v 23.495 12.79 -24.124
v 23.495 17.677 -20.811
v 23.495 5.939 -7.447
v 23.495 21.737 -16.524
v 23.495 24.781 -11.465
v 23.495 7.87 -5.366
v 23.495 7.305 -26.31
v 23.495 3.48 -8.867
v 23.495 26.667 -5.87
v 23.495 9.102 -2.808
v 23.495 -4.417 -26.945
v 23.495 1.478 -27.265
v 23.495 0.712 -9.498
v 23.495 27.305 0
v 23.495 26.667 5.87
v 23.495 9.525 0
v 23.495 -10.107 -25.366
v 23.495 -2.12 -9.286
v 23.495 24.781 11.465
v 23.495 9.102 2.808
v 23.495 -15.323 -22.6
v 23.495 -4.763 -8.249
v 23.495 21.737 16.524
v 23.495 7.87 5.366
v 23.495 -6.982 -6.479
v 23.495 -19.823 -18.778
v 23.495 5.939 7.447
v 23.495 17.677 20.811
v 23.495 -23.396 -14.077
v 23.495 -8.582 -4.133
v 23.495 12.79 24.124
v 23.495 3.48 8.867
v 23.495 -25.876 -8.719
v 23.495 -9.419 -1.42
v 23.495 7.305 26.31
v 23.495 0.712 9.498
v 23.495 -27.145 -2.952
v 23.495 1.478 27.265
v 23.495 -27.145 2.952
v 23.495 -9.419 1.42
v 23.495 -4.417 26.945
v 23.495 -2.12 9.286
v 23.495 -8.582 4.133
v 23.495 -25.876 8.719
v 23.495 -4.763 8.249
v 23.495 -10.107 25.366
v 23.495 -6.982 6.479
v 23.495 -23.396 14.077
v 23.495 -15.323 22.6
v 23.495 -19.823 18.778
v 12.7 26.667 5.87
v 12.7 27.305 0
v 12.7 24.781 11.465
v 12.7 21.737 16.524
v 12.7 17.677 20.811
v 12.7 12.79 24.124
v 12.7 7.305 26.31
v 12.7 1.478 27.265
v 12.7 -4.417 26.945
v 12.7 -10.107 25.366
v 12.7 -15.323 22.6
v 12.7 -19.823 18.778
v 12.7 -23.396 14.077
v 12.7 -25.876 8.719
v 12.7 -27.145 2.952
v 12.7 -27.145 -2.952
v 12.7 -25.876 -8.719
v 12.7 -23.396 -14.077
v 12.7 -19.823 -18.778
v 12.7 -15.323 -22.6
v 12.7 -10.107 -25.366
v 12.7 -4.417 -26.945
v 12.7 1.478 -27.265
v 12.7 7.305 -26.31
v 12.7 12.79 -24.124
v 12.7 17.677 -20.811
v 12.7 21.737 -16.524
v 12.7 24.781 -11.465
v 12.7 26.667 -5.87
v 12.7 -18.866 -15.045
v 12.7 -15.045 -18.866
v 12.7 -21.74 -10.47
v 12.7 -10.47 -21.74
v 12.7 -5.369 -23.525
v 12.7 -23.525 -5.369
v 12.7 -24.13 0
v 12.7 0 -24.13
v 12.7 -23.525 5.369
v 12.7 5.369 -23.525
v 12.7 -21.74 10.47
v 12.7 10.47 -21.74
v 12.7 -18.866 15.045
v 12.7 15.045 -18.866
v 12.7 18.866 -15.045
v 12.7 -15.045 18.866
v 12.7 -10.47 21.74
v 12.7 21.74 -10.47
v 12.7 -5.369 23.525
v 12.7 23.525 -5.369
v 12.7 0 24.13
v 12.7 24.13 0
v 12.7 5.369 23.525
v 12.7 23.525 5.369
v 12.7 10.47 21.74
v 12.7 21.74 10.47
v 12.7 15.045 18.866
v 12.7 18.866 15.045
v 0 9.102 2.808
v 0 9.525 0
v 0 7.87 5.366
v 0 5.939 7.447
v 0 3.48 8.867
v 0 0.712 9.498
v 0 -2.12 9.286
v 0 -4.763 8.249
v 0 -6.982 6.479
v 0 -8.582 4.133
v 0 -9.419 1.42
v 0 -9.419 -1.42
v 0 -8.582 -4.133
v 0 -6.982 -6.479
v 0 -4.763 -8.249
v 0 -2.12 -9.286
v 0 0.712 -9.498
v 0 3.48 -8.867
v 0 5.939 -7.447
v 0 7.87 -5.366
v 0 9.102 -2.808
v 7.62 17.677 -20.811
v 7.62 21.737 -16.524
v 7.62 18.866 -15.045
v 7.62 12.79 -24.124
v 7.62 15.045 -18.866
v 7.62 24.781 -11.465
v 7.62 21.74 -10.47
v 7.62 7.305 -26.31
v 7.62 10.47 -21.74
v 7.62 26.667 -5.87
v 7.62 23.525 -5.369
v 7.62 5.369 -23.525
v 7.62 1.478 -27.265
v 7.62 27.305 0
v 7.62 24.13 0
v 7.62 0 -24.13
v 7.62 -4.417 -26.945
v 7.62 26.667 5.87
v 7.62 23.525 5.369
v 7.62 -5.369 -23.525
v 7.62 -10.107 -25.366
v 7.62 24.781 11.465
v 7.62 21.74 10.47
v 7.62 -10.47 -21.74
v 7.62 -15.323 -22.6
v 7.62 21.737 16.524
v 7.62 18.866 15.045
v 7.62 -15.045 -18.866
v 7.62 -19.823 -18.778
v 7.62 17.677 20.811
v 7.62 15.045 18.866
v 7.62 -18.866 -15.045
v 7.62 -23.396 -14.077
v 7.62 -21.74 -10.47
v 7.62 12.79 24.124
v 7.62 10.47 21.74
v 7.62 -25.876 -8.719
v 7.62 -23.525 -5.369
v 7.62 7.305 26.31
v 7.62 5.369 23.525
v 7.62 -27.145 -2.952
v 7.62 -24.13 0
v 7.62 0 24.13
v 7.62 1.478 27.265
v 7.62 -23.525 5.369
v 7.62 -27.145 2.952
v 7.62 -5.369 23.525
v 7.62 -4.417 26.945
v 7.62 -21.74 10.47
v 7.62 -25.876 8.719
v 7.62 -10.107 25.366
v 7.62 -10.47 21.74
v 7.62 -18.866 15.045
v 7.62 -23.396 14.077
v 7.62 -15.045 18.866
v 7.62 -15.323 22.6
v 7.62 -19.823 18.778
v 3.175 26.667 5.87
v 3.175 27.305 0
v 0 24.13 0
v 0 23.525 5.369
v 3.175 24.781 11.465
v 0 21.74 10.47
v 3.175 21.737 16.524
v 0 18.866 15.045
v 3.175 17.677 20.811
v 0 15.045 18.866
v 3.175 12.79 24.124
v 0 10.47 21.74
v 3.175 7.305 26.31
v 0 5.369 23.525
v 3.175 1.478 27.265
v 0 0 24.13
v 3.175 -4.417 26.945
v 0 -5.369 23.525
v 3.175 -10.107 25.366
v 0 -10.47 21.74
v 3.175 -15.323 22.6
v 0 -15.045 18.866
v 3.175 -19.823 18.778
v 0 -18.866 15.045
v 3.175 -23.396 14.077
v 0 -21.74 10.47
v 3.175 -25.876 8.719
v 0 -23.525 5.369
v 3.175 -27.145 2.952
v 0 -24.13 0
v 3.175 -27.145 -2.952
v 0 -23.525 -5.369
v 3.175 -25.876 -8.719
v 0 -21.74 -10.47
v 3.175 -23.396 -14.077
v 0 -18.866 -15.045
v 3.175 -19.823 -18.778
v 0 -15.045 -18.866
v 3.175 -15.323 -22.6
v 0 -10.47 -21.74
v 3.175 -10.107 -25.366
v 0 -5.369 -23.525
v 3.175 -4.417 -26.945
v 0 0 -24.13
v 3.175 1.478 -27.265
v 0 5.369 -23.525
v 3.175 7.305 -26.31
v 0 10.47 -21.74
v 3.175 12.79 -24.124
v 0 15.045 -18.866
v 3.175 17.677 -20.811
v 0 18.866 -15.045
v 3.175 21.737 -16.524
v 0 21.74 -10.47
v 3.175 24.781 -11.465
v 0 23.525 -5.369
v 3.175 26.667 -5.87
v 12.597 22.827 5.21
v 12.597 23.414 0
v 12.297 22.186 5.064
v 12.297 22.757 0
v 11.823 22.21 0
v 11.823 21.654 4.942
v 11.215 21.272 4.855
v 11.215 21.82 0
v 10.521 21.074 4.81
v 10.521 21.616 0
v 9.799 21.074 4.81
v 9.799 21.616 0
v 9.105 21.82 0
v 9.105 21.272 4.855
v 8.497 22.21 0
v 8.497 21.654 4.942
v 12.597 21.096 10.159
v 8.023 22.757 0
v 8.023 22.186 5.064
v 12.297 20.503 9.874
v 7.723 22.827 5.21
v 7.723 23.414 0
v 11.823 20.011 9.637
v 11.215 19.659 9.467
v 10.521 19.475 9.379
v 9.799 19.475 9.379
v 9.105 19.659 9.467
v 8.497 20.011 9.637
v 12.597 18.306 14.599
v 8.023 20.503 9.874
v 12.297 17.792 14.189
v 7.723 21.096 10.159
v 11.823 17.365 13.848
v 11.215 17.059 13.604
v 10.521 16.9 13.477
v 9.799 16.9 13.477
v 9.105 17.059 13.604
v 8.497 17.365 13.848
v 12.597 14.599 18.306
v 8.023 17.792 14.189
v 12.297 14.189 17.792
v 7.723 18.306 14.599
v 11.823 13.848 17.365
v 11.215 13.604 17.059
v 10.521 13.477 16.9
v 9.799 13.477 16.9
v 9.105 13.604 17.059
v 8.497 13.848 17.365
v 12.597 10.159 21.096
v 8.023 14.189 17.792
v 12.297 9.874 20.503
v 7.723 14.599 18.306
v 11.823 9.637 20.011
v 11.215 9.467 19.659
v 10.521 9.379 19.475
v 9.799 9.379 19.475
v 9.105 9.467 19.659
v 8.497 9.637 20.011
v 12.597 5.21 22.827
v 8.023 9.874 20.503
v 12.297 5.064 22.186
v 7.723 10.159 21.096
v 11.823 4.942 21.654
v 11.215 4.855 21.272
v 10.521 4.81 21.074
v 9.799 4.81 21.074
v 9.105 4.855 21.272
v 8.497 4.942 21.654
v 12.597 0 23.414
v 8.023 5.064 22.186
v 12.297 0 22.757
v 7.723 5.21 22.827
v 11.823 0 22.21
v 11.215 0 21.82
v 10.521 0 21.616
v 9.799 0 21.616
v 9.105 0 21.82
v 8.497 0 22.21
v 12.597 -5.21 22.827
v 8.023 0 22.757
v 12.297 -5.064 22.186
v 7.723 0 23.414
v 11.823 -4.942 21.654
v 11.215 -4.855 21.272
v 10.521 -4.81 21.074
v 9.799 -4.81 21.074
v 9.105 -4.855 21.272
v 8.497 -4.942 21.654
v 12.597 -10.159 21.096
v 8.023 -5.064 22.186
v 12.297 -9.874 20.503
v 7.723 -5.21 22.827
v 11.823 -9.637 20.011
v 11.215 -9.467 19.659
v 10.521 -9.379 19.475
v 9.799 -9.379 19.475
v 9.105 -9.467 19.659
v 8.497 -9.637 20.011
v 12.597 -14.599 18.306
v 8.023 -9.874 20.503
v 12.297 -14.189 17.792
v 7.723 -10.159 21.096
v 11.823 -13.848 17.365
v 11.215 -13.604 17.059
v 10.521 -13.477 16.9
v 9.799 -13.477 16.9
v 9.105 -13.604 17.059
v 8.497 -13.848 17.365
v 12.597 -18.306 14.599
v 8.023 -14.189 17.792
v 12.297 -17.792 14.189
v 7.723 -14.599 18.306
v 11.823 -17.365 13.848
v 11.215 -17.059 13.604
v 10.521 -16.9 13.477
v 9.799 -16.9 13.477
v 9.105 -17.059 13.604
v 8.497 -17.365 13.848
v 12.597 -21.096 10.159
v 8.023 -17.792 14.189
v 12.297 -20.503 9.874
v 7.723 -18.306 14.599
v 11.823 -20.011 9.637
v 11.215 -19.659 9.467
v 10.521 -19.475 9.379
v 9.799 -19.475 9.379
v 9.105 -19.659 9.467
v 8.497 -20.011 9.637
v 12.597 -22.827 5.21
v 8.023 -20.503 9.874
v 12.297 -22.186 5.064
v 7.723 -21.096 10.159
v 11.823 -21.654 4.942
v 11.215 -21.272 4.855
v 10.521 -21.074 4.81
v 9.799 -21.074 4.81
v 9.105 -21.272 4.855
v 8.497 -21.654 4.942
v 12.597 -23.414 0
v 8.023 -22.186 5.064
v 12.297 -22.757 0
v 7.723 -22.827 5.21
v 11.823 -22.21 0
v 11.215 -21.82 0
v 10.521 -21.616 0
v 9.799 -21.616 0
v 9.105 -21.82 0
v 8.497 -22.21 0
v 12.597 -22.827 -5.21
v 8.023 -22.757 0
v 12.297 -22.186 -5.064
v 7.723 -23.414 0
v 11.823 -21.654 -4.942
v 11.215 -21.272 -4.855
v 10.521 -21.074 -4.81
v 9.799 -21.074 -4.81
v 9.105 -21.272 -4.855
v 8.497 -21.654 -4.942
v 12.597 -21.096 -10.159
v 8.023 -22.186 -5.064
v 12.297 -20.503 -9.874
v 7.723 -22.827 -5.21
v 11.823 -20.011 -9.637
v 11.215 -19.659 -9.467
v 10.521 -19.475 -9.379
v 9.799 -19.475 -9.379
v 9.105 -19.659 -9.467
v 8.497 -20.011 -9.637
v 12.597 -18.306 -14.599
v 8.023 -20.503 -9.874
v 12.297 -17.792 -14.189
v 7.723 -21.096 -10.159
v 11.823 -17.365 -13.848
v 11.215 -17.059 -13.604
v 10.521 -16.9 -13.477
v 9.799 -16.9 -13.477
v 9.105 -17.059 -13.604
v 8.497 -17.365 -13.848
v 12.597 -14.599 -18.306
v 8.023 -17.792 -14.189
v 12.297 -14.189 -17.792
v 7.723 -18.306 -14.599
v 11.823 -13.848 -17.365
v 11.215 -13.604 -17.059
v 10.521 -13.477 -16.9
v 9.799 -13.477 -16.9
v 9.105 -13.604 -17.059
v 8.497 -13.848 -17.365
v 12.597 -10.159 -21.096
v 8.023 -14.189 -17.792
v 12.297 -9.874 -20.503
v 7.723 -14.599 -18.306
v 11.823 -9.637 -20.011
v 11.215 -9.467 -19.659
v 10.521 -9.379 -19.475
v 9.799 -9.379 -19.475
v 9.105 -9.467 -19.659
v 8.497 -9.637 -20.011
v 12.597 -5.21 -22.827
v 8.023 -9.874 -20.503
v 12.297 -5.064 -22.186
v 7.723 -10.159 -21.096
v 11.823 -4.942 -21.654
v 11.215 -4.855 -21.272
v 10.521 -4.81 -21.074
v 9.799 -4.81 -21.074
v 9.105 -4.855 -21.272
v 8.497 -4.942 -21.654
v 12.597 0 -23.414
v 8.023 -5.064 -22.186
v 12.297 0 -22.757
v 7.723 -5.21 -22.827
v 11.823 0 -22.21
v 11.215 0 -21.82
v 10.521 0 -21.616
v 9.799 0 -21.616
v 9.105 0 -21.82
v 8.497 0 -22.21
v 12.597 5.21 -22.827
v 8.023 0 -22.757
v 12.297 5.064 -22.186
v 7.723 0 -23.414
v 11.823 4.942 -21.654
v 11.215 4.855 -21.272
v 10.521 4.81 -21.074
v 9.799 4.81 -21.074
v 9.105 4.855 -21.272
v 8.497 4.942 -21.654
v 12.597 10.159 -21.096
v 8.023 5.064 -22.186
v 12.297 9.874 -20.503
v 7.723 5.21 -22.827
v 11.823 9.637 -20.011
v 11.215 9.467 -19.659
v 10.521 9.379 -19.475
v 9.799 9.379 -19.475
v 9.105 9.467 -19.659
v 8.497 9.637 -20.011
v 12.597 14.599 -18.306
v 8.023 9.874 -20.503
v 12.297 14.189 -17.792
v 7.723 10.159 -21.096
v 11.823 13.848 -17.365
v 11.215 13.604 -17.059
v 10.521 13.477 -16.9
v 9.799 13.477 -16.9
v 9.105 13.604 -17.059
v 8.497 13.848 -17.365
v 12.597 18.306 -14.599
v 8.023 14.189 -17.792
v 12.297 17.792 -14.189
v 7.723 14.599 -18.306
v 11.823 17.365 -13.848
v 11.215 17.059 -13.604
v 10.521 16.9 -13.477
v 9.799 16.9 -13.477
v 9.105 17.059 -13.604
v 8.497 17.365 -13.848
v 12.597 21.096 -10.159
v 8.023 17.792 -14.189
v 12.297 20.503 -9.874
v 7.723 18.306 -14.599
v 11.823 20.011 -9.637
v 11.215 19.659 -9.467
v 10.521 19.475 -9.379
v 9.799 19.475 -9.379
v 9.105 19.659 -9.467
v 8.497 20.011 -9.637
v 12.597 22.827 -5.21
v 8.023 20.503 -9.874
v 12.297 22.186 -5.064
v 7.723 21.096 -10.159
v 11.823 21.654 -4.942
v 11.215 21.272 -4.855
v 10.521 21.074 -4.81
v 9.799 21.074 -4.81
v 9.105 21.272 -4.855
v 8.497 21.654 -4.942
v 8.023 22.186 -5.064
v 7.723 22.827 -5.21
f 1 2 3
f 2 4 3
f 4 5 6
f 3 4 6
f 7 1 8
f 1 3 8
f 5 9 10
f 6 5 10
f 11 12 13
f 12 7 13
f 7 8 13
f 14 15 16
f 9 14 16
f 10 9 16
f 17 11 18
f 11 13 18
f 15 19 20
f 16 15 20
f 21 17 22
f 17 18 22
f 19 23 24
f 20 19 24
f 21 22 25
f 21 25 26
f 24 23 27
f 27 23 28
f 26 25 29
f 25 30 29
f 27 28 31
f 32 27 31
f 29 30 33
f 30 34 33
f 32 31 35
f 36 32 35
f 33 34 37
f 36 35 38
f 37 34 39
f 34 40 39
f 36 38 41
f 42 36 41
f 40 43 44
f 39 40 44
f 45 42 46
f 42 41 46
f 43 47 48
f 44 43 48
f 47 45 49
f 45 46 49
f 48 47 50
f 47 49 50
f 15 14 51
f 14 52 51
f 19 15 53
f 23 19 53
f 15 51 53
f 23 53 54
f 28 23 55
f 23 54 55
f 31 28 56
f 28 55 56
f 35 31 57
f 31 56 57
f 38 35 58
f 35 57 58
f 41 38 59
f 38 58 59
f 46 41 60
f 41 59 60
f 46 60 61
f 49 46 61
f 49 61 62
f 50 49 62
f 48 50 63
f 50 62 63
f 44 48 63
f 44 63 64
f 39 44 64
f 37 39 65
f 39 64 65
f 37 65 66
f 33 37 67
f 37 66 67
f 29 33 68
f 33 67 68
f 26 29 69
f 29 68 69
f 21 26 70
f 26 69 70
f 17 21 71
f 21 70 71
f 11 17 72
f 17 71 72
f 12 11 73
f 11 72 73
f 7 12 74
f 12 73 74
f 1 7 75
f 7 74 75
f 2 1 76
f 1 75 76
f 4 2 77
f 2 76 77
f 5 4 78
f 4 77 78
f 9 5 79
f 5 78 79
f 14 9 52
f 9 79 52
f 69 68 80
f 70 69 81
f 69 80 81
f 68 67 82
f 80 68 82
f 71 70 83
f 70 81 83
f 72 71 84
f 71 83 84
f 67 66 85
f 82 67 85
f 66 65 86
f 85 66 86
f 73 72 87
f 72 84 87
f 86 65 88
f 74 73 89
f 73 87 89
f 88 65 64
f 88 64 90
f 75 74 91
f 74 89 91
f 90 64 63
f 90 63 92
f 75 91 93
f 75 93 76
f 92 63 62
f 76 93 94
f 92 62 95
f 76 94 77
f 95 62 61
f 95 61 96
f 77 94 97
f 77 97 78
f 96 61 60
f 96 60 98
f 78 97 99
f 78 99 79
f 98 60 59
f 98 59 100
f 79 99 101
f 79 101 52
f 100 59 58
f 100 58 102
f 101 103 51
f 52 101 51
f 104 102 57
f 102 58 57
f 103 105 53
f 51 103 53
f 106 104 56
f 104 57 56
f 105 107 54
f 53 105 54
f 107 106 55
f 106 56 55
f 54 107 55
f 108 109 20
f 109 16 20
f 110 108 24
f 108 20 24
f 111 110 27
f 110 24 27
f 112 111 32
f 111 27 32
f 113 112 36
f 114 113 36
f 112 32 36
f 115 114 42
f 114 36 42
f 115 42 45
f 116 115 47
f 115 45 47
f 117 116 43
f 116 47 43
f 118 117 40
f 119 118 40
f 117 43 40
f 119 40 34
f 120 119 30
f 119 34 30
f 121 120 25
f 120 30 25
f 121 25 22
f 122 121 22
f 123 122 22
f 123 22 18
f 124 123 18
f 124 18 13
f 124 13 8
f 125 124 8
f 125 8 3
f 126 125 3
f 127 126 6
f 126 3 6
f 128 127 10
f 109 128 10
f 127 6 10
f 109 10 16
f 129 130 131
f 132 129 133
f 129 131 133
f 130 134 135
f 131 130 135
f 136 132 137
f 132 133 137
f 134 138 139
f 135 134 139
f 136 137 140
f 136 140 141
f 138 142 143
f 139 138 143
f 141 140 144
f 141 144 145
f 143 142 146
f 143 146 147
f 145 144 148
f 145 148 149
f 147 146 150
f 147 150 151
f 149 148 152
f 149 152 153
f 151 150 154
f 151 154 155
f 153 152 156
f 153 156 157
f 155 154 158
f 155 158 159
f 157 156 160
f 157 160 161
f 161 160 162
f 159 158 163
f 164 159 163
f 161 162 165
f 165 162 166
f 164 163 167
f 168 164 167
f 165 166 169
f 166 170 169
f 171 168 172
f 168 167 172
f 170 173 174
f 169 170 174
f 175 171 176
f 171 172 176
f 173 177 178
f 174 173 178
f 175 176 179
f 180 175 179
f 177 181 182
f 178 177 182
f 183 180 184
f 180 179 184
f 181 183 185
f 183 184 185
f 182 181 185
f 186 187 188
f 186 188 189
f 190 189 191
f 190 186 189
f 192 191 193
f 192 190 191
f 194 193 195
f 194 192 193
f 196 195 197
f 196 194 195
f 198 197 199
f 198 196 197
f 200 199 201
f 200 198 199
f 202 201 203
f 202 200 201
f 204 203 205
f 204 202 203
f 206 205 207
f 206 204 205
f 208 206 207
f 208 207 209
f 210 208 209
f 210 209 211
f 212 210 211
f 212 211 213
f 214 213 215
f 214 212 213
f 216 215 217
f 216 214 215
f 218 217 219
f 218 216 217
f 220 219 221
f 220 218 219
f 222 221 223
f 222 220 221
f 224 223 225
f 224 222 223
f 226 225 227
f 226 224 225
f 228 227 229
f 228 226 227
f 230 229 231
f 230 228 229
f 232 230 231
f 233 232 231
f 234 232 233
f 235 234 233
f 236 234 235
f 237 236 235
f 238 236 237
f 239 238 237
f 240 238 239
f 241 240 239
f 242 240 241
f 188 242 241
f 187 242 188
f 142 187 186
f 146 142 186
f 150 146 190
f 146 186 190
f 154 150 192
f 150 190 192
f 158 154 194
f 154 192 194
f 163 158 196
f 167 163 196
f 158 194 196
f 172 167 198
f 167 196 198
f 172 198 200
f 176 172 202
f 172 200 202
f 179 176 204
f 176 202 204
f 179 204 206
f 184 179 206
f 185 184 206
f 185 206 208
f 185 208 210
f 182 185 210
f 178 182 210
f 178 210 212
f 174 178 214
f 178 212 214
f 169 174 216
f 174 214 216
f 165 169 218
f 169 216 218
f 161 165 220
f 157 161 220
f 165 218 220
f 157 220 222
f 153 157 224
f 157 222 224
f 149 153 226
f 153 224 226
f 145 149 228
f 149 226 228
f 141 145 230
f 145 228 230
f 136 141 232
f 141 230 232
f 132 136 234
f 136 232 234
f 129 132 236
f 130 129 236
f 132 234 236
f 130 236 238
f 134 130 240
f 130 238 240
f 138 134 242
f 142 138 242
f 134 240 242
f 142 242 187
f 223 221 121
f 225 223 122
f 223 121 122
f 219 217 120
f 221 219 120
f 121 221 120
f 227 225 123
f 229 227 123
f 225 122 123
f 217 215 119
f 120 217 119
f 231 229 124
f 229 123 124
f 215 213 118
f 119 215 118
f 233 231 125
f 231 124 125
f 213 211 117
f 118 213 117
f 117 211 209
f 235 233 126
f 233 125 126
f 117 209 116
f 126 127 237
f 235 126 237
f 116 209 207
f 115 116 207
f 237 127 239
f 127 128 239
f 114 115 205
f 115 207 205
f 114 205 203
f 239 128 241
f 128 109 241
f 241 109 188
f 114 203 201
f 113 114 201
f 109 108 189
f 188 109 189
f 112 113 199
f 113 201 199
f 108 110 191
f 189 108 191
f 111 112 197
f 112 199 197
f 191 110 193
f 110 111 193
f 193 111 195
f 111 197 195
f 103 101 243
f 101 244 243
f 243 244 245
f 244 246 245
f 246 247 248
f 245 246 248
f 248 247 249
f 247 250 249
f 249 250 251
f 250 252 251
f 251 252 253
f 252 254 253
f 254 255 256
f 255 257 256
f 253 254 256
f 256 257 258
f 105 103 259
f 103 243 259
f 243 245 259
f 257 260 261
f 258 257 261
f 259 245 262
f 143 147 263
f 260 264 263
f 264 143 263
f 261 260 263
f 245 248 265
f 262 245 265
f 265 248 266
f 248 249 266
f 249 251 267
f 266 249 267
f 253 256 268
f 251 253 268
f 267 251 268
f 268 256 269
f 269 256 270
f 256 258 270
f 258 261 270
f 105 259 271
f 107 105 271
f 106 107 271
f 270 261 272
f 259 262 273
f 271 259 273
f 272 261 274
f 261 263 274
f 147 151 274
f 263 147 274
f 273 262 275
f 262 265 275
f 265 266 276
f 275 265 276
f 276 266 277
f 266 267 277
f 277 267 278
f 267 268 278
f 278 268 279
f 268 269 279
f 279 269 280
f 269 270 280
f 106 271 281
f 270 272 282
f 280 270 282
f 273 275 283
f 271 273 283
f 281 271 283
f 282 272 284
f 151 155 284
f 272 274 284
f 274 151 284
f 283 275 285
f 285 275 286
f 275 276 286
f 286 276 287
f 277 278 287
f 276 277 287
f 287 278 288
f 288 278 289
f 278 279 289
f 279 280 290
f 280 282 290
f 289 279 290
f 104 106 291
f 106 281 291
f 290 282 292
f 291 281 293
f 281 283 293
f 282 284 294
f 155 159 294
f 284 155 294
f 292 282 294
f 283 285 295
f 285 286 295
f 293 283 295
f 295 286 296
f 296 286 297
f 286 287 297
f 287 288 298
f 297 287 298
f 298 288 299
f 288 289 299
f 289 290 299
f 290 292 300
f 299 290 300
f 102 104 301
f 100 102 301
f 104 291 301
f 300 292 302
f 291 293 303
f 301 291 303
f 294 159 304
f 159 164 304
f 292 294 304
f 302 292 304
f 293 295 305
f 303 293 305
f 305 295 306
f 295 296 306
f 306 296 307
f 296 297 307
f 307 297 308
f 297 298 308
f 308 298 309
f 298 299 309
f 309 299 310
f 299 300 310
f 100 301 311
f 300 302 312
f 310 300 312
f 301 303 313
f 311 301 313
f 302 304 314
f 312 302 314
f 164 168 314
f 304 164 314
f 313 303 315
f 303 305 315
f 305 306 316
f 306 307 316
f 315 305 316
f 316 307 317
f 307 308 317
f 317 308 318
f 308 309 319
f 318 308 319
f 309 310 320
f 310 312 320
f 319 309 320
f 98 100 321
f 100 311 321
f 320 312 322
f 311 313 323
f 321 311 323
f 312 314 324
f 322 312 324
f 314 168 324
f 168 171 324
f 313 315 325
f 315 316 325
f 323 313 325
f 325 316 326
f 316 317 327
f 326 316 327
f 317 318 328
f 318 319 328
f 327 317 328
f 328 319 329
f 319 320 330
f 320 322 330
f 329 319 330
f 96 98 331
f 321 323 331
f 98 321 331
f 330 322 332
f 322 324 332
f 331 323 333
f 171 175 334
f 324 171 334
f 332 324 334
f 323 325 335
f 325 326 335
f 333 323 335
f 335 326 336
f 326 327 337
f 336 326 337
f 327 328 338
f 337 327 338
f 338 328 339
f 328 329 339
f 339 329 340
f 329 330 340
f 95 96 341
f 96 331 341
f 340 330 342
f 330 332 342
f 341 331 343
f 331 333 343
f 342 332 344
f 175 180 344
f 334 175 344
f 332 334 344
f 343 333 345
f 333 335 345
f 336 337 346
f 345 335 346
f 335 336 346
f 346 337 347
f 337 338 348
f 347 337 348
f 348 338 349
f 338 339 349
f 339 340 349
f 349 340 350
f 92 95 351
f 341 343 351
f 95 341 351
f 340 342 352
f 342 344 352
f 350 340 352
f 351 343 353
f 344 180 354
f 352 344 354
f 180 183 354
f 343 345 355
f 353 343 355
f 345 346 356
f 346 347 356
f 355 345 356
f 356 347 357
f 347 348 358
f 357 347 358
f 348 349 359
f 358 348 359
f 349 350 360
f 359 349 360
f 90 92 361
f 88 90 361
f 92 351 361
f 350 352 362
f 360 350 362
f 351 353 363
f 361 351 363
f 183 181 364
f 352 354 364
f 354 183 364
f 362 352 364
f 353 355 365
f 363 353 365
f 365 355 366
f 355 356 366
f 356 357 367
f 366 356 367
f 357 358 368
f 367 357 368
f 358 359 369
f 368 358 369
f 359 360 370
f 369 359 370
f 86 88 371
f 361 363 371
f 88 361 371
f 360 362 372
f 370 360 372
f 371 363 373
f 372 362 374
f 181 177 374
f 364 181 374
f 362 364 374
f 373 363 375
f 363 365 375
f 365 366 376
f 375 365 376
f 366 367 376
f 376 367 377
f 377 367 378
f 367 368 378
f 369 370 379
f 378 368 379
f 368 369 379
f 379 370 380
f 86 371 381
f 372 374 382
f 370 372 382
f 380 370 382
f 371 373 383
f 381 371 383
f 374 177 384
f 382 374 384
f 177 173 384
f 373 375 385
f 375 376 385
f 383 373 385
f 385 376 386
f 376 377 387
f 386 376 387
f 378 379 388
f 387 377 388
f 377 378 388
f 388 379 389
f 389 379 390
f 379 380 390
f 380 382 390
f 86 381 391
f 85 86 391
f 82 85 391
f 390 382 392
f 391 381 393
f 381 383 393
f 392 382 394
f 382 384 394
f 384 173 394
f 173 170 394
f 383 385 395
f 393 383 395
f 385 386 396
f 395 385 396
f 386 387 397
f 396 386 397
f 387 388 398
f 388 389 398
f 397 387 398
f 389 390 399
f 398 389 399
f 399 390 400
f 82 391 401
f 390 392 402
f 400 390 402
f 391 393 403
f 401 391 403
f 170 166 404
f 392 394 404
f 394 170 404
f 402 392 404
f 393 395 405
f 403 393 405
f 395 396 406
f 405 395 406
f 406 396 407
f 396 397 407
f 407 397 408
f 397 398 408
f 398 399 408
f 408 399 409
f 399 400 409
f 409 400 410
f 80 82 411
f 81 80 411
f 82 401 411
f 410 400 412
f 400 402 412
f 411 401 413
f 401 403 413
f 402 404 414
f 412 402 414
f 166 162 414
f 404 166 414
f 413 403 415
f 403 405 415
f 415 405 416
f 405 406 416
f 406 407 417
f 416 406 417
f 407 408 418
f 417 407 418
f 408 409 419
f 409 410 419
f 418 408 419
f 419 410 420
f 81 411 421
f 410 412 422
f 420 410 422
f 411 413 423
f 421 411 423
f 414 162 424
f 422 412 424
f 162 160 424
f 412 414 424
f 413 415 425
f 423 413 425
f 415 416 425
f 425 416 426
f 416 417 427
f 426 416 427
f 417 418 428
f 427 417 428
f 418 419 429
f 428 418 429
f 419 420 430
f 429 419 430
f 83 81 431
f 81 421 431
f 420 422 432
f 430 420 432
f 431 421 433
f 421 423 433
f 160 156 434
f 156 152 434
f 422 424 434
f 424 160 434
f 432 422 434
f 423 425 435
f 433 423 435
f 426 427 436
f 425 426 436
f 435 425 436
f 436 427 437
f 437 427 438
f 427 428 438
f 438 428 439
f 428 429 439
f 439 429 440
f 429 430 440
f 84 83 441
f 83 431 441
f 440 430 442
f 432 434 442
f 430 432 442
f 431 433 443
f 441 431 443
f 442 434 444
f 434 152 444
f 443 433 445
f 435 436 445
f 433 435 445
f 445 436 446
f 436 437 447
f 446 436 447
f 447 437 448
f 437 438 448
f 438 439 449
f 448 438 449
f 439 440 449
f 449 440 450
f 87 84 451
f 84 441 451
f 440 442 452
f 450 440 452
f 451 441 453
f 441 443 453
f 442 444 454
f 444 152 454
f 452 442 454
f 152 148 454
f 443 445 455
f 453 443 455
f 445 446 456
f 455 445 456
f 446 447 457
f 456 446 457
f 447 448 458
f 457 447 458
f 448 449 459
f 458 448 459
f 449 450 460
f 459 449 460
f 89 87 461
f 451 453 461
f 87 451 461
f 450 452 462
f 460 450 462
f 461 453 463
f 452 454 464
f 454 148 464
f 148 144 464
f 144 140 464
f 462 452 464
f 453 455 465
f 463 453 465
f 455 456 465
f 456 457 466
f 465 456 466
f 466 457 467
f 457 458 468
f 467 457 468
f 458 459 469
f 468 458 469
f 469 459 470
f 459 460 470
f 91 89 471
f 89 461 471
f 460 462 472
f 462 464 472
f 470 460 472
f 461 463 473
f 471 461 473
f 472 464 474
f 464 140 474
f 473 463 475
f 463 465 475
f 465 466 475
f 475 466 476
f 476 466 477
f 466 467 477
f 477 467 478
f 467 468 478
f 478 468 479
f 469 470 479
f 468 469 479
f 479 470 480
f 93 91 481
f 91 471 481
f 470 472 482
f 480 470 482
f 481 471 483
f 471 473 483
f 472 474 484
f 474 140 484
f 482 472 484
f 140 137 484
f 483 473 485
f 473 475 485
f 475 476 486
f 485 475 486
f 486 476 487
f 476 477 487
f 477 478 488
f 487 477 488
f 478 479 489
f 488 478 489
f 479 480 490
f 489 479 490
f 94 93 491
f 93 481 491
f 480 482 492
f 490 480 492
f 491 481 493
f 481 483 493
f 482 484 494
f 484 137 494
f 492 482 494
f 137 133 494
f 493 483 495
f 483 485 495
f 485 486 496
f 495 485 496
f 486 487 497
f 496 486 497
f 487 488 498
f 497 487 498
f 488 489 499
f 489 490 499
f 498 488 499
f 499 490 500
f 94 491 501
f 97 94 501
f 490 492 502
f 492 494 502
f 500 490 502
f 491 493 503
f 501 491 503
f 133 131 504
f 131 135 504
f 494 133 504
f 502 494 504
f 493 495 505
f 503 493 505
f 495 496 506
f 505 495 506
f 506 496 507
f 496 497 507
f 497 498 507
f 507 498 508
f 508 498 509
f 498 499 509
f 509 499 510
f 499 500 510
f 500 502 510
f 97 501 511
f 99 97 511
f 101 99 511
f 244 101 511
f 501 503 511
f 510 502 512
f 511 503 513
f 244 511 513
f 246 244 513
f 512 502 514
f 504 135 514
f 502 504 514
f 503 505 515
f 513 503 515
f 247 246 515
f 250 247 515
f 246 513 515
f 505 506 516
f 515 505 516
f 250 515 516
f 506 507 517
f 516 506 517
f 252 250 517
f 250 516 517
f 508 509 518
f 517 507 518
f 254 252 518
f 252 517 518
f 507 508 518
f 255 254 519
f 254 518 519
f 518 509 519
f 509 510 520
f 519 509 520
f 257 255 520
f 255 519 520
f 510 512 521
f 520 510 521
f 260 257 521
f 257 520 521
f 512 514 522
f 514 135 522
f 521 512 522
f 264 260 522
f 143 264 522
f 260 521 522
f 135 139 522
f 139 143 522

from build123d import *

# Parameters (mm, degrees)
CHAMFER1_SIZE = 3.175


with BuildPart() as part:
    # Sketch1 → Revolve1 (revolve)
    with BuildSketch(Plane.XY):
        with BuildLine():
            Line((0, 27.305), (0, 9.525))
            Line((0, 9.525), (23.495, 9.525))
            Line((23.495, 9.525), (23.495, 27.305))
            Line((23.495, 27.305), (12.7, 27.305))
            Line((12.7, 27.305), (12.7, 24.13))
            ThreePointArc((12.7, 24.13), (10.16, 21.59), (7.62, 24.13))
            Line((7.62, 24.13), (7.62, 27.305))
            Line((7.62, 27.305), (0, 27.305))
        make_face()
    revolve(axis=Axis((0, 0, 0), (1, 0, 0)))

    # Chamfer1
    chamfer1_edges = [part.edges().sort_by_distance(p)[0] for p in [
        (0, -27.305, 0),
    ]]
    chamfer(chamfer1_edges, length=CHAMFER1_SIZE)


solid = part.part
